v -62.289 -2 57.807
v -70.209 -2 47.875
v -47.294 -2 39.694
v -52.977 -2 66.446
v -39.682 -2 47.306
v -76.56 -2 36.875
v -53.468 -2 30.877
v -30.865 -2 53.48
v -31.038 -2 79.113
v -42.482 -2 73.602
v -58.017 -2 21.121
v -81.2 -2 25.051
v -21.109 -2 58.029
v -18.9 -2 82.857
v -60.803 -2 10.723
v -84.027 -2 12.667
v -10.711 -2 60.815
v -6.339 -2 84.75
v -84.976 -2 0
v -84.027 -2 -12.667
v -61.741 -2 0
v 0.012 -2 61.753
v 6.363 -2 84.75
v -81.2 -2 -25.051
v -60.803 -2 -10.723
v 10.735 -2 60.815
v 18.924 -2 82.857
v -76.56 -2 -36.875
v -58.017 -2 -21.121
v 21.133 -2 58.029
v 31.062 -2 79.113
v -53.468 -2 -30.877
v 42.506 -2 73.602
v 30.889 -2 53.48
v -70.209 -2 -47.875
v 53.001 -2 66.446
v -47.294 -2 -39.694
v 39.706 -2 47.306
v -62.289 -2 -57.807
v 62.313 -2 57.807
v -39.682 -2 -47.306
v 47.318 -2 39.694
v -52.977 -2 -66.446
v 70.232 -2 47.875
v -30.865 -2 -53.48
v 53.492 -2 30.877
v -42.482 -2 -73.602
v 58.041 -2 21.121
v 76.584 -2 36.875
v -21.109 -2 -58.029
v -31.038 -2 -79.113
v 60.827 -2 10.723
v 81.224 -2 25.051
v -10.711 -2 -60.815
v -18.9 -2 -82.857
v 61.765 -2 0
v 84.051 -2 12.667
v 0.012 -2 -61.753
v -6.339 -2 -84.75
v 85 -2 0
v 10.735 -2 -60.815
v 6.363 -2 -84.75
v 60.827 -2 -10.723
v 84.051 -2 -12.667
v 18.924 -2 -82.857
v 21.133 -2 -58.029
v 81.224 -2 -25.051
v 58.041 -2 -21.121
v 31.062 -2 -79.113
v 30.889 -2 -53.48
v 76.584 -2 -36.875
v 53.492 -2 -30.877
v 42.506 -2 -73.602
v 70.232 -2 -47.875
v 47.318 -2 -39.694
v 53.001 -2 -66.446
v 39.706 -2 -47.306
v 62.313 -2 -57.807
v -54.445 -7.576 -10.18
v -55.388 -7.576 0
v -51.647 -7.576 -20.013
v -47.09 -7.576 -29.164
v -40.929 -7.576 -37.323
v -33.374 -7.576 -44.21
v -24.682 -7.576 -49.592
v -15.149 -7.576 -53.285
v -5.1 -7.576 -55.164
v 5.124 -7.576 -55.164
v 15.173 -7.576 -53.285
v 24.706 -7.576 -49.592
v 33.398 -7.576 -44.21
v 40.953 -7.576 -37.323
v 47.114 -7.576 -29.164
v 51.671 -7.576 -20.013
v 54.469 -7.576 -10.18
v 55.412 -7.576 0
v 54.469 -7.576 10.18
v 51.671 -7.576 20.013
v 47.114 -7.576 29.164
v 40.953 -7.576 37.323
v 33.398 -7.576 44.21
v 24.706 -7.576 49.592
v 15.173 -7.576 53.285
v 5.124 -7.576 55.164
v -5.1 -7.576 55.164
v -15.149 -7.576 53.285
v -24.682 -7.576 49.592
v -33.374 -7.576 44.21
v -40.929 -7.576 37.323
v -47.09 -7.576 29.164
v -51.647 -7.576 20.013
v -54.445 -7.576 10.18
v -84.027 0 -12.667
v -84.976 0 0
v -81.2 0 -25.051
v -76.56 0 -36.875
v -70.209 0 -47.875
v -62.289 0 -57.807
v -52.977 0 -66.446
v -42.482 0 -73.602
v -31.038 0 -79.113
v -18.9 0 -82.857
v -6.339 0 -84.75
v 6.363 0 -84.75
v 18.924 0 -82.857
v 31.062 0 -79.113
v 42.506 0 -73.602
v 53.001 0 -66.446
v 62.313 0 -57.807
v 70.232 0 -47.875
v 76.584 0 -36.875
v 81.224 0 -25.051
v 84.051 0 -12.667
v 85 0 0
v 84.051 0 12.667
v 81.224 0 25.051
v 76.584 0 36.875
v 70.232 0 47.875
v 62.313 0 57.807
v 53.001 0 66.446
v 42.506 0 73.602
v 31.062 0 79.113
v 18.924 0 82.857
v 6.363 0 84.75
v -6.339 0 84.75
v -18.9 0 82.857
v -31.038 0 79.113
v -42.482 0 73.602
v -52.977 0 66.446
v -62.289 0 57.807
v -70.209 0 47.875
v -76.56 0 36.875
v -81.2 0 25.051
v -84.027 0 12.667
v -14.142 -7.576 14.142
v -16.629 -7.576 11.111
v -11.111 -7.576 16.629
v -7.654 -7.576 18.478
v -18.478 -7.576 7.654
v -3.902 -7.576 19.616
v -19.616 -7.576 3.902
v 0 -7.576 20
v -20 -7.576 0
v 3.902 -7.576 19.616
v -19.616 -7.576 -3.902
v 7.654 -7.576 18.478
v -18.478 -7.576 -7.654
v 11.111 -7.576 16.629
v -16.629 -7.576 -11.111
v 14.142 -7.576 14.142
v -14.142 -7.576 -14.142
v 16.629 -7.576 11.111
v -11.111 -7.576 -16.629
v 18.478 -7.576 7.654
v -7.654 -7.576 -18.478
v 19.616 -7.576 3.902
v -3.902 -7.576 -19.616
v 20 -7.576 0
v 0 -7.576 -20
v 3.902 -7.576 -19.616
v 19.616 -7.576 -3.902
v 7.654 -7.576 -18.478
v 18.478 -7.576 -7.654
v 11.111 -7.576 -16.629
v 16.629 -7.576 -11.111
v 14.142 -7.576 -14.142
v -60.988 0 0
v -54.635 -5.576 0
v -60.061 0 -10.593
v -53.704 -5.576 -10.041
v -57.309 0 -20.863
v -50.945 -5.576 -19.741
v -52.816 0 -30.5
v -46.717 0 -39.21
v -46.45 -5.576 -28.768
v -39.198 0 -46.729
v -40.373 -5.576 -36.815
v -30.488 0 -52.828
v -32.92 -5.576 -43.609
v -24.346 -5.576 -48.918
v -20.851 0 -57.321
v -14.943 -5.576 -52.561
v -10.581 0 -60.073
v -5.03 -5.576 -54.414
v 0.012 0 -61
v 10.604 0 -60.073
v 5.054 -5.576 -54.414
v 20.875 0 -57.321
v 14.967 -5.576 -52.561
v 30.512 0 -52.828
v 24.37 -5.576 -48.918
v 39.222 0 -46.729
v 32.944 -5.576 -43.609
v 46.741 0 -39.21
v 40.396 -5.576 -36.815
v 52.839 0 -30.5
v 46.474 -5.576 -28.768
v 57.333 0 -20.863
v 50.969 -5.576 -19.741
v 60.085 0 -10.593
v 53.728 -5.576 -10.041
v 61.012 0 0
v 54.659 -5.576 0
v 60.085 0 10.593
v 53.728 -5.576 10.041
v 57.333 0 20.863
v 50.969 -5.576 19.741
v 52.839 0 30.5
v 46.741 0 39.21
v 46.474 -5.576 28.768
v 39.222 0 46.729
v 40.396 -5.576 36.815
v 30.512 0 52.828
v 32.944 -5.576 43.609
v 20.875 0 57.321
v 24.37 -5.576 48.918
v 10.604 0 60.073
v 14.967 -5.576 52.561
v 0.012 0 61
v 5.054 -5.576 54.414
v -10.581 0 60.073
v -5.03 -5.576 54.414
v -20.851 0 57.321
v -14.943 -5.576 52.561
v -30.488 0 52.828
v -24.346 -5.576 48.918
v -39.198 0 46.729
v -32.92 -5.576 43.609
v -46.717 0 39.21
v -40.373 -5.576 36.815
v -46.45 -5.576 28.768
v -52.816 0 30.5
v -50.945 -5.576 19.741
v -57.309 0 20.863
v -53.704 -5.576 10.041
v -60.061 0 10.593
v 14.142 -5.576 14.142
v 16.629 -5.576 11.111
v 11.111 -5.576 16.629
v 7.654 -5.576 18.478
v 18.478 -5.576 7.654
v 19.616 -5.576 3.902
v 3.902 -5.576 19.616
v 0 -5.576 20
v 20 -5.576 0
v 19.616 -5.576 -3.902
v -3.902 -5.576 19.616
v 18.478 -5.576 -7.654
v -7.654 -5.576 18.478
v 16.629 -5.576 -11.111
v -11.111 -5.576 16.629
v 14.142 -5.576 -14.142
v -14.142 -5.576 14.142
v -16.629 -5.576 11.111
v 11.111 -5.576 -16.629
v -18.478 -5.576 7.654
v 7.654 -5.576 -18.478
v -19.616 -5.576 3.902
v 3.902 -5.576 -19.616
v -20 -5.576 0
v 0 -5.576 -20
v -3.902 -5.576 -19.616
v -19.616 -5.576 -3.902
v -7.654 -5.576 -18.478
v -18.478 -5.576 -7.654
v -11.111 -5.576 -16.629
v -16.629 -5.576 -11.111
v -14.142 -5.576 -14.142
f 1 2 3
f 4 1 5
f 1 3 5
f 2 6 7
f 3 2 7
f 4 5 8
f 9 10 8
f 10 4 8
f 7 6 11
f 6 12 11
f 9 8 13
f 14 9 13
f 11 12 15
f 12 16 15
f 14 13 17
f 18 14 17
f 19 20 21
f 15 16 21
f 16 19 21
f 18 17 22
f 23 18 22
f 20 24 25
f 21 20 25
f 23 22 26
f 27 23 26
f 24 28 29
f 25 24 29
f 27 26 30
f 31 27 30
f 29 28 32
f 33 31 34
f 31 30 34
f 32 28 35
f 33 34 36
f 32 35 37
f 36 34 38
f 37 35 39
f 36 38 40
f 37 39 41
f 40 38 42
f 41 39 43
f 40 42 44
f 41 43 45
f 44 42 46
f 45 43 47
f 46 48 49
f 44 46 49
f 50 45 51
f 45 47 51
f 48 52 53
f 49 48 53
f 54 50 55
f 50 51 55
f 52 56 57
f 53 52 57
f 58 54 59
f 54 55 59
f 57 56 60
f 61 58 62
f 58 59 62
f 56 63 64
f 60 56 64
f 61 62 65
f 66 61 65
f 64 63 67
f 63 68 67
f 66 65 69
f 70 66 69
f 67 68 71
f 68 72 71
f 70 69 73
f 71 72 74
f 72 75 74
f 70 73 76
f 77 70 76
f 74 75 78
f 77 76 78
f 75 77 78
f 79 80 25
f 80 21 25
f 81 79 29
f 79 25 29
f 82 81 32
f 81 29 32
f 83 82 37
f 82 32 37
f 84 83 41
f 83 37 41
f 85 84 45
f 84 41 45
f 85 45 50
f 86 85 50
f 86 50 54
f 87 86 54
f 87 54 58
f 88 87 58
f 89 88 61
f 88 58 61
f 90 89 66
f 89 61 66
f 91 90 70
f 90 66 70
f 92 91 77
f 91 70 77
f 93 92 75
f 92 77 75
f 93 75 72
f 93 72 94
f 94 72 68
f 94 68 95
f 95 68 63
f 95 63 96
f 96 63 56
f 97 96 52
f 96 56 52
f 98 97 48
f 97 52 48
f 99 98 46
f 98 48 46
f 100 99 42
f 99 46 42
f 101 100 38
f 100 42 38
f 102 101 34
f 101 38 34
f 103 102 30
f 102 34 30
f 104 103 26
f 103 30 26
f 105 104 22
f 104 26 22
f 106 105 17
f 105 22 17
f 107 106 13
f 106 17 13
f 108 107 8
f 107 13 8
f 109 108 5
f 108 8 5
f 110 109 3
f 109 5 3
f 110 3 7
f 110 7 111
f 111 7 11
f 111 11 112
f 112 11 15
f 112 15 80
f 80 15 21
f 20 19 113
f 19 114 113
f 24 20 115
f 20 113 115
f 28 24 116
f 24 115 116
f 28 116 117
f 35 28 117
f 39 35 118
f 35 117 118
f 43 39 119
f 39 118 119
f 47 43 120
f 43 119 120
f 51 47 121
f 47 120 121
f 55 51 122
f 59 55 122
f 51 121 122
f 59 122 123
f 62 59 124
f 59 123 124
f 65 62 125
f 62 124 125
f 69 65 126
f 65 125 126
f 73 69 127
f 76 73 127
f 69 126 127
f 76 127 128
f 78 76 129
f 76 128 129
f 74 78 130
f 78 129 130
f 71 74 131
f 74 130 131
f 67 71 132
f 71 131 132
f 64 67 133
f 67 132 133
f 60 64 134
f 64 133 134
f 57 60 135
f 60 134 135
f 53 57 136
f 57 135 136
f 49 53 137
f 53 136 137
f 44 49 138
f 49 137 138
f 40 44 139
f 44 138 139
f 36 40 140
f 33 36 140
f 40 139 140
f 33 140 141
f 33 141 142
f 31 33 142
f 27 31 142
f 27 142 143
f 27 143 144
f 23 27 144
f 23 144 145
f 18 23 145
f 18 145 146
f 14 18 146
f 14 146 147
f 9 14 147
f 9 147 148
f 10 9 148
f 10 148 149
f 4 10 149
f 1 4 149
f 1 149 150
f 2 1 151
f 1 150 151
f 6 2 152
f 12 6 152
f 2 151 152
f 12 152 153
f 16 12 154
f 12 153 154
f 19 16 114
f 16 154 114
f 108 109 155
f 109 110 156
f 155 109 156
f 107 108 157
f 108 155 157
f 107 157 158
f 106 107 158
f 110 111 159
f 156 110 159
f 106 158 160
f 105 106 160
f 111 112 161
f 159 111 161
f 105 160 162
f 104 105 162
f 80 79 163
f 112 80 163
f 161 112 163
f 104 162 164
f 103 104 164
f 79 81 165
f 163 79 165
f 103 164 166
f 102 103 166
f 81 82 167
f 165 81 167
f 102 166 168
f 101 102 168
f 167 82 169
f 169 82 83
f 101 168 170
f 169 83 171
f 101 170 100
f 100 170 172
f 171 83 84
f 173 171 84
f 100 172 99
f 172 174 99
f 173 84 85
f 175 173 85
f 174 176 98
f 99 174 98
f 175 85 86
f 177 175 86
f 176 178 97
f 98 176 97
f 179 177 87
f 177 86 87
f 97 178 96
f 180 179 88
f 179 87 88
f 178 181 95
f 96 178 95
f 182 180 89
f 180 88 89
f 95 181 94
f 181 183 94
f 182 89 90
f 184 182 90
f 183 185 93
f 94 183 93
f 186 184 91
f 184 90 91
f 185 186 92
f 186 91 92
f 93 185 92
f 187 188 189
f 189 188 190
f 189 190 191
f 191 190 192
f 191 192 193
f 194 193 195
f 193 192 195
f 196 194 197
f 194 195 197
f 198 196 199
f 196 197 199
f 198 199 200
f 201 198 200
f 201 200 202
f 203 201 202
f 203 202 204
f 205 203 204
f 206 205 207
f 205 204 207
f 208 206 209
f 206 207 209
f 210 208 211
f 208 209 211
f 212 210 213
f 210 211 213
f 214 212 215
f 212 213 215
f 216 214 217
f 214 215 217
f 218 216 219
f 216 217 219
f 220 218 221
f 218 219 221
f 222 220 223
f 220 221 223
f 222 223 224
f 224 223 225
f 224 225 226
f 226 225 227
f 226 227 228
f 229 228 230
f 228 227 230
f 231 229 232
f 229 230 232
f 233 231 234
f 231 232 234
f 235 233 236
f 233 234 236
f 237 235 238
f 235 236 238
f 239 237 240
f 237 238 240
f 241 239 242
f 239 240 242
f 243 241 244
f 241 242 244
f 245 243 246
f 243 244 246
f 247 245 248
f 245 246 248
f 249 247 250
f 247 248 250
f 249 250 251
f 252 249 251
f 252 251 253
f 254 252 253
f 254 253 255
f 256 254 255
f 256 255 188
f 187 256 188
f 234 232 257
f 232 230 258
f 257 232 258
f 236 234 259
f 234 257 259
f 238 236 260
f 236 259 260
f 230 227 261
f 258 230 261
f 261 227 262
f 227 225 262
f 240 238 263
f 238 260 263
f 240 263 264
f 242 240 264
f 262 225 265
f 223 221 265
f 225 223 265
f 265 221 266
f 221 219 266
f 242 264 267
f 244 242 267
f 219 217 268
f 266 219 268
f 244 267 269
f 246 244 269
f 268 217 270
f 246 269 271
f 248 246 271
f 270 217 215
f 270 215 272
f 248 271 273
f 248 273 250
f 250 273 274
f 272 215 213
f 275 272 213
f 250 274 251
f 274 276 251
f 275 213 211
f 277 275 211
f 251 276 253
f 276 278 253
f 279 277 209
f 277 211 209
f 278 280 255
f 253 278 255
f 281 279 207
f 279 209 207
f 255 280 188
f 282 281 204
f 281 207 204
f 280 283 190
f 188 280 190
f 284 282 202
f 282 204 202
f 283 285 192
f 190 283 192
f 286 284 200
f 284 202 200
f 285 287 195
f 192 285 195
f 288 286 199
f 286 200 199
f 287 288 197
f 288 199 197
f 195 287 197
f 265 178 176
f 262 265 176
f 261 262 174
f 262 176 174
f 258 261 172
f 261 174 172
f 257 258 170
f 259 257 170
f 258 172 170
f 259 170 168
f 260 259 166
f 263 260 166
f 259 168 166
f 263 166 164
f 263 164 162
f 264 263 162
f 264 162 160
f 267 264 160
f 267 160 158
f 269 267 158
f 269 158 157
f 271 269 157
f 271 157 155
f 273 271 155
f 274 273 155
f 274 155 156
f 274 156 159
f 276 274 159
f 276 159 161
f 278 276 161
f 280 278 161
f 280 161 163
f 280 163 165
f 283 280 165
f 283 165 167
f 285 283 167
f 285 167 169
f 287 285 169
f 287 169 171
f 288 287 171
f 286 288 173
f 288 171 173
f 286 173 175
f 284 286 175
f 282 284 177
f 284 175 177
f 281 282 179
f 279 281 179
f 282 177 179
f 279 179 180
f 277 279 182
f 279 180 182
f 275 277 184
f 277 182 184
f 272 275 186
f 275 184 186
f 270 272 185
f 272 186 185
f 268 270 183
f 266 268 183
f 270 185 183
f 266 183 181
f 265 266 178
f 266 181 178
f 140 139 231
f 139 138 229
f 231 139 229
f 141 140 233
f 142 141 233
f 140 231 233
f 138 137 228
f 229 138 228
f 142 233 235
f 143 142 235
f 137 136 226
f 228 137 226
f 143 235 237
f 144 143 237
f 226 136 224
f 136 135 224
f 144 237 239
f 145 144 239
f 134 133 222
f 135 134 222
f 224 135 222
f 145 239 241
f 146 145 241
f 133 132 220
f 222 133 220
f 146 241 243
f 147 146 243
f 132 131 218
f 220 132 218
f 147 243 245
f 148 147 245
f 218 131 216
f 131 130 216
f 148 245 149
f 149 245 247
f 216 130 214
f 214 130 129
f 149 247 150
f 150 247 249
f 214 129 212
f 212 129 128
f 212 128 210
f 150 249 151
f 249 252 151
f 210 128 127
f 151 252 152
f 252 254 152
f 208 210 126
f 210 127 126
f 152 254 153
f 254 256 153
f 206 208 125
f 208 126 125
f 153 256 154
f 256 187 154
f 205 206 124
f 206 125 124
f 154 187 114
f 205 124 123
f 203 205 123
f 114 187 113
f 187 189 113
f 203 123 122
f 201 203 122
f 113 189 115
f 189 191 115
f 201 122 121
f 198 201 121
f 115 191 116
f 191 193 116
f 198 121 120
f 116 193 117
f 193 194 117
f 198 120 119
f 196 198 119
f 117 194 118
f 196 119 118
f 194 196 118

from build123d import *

# Parameters (mm, degrees)
SKETCH7_R          = 20
CUT_EXTRUDE1_DEPTH = 121.438221623


with BuildPart() as part:
    # Sketch6 → Revolve2 (revolve)
    with BuildSketch(Plane.XY, mode=Mode.PRIVATE) as revolve2_sk:
        Polygon((85, 0), (61.011931512, 0), (54.658752463, -5.575845989), (0.011931512, -5.575845989), (0.011931512, -7.575845989), (55.411931512, -7.575845989), (61.76511056, -2), (85, -2), align=None)
    revolve(revolve2_sk.sketch.rotate(Axis((0.011931512, 83.769679303, 0), (0, -1, 0)), 180), axis=Axis((0.011931512, 83.769679303, 0), (0, -1, 0)))

    # Sketch7 → Cut-Extrude1 (cut, through all)
    with BuildSketch(Plane.XZ.offset(7.575845989)):
        Circle(SKETCH7_R)
    extrude(amount=-CUT_EXTRUDE1_DEPTH, mode=Mode.SUBTRACT)


solid = part.part
